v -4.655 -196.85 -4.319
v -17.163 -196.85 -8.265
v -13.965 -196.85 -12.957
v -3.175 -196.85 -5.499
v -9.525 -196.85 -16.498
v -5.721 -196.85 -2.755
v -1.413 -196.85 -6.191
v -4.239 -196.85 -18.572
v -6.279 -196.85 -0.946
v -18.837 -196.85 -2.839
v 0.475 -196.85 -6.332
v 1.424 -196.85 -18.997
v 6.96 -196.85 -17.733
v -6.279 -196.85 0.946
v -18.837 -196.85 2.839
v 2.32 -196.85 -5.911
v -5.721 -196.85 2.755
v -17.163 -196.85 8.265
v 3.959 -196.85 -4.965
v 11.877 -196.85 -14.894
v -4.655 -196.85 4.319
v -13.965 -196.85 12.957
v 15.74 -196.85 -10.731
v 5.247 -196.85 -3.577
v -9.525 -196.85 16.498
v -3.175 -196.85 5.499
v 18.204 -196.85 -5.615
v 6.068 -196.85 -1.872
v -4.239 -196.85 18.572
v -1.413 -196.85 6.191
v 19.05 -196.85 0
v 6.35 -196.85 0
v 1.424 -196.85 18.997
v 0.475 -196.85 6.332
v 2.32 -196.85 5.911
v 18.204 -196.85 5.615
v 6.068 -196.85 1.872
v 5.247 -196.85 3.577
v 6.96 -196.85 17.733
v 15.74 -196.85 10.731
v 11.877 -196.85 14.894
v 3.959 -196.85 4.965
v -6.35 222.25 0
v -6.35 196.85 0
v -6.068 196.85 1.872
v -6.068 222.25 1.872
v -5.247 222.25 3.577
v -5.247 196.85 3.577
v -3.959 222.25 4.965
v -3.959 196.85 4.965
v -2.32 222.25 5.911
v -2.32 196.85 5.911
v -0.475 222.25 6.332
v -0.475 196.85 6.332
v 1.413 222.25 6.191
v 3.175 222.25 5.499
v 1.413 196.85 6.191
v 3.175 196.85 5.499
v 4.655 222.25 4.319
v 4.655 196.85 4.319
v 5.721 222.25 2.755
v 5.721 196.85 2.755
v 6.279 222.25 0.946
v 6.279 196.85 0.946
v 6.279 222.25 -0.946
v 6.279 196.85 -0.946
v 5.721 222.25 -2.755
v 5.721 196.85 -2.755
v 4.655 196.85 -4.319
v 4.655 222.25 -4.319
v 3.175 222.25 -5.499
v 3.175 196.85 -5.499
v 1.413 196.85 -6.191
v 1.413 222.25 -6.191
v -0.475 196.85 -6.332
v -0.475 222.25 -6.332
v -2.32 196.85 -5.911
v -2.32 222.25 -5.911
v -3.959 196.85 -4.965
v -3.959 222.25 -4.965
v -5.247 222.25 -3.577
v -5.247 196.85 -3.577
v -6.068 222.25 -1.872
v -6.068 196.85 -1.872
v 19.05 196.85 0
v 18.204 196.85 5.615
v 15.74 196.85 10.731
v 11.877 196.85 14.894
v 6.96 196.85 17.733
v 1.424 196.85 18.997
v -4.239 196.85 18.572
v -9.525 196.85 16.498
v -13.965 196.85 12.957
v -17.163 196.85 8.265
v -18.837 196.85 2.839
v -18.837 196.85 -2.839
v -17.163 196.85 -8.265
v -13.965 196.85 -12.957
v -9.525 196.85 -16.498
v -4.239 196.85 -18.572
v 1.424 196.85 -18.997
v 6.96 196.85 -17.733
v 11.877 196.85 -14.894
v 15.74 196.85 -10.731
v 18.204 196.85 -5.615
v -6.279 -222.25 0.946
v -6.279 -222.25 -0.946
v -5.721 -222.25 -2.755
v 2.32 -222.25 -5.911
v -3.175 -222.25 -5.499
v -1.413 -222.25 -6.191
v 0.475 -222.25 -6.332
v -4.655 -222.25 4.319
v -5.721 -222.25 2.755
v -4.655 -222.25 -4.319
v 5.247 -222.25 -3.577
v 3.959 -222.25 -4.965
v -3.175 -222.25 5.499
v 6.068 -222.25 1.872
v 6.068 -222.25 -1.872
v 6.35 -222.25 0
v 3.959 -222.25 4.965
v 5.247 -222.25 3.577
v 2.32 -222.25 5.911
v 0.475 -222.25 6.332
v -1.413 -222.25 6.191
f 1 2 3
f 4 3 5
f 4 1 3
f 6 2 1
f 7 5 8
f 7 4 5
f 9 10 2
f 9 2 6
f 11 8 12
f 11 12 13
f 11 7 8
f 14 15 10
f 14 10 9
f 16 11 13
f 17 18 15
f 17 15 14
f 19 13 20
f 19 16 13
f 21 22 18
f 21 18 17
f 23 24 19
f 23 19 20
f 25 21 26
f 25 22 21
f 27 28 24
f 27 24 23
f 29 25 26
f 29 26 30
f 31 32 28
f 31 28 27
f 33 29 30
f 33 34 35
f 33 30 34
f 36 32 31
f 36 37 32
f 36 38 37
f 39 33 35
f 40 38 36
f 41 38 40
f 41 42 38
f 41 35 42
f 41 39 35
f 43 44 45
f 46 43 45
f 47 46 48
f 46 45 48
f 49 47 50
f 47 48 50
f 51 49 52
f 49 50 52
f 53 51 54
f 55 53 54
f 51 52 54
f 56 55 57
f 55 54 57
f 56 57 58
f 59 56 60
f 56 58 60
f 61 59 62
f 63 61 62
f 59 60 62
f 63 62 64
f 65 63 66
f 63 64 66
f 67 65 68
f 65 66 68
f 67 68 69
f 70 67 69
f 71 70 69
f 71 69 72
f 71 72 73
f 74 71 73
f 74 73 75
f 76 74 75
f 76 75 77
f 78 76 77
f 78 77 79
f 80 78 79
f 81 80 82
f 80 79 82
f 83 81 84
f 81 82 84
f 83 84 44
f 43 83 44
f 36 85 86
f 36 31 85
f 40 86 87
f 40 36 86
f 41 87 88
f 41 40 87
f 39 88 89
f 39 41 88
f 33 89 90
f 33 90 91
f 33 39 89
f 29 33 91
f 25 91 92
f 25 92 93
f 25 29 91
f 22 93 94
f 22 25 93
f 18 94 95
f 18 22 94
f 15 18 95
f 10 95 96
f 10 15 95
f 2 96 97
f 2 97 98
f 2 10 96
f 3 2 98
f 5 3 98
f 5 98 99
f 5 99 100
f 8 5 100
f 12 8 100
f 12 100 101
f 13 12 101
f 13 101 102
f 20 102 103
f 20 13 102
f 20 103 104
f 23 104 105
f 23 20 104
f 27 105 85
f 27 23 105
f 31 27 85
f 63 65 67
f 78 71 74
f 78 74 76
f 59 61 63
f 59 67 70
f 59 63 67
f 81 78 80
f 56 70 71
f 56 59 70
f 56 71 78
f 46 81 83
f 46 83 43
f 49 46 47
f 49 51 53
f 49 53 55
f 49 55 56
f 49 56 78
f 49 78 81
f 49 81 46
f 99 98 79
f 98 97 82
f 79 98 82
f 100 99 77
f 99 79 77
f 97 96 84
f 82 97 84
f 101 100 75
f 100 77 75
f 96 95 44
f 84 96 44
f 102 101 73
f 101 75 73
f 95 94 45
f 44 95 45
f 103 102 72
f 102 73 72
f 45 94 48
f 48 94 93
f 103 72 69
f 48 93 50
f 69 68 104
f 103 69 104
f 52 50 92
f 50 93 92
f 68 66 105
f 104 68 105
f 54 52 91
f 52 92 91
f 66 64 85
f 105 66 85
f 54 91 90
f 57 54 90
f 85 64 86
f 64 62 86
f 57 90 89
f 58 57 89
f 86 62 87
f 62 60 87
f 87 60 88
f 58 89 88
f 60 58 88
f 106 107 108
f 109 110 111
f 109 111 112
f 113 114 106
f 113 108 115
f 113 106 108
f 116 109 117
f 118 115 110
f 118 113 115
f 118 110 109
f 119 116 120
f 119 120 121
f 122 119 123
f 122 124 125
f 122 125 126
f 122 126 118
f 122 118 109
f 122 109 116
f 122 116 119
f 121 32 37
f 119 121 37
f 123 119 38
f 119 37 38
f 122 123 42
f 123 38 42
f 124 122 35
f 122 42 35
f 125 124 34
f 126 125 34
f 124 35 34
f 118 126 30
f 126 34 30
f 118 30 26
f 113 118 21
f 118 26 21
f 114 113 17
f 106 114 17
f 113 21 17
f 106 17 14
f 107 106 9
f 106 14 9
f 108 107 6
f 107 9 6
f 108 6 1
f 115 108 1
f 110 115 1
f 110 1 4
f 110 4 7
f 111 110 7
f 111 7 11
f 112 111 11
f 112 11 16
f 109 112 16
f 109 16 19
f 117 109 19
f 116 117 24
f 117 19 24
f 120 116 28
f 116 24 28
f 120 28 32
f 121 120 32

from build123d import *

# Parameters (mm, degrees)
F0_R     = 19.05
F1_DEPTH = 196.85
F2_R     = 6.35
F3_DEPTH = 25.4
F4_R     = 6.35
F5_DEPTH = 25.4


with BuildPart() as f1:
    # F0 (on Front) → F1 (new body, symmetric)
    with BuildSketch(Plane.XZ):
        Circle(F0_R)
    extrude(amount=F1_DEPTH, both=True)

    # F2 (on face) → F3 (join)
    with BuildSketch(Plane(origin=(0, 196.85, 0), x_dir=(-1, 0, 0), z_dir=(0, 1, 0))):
        Circle(F2_R)
    extrude(amount=F3_DEPTH)

    # F4 (on face) → F5 (join)
    with BuildSketch(Plane.XZ.offset(196.85)):
        Circle(F4_R)
    extrude(amount=F5_DEPTH)


solid = f1.part
